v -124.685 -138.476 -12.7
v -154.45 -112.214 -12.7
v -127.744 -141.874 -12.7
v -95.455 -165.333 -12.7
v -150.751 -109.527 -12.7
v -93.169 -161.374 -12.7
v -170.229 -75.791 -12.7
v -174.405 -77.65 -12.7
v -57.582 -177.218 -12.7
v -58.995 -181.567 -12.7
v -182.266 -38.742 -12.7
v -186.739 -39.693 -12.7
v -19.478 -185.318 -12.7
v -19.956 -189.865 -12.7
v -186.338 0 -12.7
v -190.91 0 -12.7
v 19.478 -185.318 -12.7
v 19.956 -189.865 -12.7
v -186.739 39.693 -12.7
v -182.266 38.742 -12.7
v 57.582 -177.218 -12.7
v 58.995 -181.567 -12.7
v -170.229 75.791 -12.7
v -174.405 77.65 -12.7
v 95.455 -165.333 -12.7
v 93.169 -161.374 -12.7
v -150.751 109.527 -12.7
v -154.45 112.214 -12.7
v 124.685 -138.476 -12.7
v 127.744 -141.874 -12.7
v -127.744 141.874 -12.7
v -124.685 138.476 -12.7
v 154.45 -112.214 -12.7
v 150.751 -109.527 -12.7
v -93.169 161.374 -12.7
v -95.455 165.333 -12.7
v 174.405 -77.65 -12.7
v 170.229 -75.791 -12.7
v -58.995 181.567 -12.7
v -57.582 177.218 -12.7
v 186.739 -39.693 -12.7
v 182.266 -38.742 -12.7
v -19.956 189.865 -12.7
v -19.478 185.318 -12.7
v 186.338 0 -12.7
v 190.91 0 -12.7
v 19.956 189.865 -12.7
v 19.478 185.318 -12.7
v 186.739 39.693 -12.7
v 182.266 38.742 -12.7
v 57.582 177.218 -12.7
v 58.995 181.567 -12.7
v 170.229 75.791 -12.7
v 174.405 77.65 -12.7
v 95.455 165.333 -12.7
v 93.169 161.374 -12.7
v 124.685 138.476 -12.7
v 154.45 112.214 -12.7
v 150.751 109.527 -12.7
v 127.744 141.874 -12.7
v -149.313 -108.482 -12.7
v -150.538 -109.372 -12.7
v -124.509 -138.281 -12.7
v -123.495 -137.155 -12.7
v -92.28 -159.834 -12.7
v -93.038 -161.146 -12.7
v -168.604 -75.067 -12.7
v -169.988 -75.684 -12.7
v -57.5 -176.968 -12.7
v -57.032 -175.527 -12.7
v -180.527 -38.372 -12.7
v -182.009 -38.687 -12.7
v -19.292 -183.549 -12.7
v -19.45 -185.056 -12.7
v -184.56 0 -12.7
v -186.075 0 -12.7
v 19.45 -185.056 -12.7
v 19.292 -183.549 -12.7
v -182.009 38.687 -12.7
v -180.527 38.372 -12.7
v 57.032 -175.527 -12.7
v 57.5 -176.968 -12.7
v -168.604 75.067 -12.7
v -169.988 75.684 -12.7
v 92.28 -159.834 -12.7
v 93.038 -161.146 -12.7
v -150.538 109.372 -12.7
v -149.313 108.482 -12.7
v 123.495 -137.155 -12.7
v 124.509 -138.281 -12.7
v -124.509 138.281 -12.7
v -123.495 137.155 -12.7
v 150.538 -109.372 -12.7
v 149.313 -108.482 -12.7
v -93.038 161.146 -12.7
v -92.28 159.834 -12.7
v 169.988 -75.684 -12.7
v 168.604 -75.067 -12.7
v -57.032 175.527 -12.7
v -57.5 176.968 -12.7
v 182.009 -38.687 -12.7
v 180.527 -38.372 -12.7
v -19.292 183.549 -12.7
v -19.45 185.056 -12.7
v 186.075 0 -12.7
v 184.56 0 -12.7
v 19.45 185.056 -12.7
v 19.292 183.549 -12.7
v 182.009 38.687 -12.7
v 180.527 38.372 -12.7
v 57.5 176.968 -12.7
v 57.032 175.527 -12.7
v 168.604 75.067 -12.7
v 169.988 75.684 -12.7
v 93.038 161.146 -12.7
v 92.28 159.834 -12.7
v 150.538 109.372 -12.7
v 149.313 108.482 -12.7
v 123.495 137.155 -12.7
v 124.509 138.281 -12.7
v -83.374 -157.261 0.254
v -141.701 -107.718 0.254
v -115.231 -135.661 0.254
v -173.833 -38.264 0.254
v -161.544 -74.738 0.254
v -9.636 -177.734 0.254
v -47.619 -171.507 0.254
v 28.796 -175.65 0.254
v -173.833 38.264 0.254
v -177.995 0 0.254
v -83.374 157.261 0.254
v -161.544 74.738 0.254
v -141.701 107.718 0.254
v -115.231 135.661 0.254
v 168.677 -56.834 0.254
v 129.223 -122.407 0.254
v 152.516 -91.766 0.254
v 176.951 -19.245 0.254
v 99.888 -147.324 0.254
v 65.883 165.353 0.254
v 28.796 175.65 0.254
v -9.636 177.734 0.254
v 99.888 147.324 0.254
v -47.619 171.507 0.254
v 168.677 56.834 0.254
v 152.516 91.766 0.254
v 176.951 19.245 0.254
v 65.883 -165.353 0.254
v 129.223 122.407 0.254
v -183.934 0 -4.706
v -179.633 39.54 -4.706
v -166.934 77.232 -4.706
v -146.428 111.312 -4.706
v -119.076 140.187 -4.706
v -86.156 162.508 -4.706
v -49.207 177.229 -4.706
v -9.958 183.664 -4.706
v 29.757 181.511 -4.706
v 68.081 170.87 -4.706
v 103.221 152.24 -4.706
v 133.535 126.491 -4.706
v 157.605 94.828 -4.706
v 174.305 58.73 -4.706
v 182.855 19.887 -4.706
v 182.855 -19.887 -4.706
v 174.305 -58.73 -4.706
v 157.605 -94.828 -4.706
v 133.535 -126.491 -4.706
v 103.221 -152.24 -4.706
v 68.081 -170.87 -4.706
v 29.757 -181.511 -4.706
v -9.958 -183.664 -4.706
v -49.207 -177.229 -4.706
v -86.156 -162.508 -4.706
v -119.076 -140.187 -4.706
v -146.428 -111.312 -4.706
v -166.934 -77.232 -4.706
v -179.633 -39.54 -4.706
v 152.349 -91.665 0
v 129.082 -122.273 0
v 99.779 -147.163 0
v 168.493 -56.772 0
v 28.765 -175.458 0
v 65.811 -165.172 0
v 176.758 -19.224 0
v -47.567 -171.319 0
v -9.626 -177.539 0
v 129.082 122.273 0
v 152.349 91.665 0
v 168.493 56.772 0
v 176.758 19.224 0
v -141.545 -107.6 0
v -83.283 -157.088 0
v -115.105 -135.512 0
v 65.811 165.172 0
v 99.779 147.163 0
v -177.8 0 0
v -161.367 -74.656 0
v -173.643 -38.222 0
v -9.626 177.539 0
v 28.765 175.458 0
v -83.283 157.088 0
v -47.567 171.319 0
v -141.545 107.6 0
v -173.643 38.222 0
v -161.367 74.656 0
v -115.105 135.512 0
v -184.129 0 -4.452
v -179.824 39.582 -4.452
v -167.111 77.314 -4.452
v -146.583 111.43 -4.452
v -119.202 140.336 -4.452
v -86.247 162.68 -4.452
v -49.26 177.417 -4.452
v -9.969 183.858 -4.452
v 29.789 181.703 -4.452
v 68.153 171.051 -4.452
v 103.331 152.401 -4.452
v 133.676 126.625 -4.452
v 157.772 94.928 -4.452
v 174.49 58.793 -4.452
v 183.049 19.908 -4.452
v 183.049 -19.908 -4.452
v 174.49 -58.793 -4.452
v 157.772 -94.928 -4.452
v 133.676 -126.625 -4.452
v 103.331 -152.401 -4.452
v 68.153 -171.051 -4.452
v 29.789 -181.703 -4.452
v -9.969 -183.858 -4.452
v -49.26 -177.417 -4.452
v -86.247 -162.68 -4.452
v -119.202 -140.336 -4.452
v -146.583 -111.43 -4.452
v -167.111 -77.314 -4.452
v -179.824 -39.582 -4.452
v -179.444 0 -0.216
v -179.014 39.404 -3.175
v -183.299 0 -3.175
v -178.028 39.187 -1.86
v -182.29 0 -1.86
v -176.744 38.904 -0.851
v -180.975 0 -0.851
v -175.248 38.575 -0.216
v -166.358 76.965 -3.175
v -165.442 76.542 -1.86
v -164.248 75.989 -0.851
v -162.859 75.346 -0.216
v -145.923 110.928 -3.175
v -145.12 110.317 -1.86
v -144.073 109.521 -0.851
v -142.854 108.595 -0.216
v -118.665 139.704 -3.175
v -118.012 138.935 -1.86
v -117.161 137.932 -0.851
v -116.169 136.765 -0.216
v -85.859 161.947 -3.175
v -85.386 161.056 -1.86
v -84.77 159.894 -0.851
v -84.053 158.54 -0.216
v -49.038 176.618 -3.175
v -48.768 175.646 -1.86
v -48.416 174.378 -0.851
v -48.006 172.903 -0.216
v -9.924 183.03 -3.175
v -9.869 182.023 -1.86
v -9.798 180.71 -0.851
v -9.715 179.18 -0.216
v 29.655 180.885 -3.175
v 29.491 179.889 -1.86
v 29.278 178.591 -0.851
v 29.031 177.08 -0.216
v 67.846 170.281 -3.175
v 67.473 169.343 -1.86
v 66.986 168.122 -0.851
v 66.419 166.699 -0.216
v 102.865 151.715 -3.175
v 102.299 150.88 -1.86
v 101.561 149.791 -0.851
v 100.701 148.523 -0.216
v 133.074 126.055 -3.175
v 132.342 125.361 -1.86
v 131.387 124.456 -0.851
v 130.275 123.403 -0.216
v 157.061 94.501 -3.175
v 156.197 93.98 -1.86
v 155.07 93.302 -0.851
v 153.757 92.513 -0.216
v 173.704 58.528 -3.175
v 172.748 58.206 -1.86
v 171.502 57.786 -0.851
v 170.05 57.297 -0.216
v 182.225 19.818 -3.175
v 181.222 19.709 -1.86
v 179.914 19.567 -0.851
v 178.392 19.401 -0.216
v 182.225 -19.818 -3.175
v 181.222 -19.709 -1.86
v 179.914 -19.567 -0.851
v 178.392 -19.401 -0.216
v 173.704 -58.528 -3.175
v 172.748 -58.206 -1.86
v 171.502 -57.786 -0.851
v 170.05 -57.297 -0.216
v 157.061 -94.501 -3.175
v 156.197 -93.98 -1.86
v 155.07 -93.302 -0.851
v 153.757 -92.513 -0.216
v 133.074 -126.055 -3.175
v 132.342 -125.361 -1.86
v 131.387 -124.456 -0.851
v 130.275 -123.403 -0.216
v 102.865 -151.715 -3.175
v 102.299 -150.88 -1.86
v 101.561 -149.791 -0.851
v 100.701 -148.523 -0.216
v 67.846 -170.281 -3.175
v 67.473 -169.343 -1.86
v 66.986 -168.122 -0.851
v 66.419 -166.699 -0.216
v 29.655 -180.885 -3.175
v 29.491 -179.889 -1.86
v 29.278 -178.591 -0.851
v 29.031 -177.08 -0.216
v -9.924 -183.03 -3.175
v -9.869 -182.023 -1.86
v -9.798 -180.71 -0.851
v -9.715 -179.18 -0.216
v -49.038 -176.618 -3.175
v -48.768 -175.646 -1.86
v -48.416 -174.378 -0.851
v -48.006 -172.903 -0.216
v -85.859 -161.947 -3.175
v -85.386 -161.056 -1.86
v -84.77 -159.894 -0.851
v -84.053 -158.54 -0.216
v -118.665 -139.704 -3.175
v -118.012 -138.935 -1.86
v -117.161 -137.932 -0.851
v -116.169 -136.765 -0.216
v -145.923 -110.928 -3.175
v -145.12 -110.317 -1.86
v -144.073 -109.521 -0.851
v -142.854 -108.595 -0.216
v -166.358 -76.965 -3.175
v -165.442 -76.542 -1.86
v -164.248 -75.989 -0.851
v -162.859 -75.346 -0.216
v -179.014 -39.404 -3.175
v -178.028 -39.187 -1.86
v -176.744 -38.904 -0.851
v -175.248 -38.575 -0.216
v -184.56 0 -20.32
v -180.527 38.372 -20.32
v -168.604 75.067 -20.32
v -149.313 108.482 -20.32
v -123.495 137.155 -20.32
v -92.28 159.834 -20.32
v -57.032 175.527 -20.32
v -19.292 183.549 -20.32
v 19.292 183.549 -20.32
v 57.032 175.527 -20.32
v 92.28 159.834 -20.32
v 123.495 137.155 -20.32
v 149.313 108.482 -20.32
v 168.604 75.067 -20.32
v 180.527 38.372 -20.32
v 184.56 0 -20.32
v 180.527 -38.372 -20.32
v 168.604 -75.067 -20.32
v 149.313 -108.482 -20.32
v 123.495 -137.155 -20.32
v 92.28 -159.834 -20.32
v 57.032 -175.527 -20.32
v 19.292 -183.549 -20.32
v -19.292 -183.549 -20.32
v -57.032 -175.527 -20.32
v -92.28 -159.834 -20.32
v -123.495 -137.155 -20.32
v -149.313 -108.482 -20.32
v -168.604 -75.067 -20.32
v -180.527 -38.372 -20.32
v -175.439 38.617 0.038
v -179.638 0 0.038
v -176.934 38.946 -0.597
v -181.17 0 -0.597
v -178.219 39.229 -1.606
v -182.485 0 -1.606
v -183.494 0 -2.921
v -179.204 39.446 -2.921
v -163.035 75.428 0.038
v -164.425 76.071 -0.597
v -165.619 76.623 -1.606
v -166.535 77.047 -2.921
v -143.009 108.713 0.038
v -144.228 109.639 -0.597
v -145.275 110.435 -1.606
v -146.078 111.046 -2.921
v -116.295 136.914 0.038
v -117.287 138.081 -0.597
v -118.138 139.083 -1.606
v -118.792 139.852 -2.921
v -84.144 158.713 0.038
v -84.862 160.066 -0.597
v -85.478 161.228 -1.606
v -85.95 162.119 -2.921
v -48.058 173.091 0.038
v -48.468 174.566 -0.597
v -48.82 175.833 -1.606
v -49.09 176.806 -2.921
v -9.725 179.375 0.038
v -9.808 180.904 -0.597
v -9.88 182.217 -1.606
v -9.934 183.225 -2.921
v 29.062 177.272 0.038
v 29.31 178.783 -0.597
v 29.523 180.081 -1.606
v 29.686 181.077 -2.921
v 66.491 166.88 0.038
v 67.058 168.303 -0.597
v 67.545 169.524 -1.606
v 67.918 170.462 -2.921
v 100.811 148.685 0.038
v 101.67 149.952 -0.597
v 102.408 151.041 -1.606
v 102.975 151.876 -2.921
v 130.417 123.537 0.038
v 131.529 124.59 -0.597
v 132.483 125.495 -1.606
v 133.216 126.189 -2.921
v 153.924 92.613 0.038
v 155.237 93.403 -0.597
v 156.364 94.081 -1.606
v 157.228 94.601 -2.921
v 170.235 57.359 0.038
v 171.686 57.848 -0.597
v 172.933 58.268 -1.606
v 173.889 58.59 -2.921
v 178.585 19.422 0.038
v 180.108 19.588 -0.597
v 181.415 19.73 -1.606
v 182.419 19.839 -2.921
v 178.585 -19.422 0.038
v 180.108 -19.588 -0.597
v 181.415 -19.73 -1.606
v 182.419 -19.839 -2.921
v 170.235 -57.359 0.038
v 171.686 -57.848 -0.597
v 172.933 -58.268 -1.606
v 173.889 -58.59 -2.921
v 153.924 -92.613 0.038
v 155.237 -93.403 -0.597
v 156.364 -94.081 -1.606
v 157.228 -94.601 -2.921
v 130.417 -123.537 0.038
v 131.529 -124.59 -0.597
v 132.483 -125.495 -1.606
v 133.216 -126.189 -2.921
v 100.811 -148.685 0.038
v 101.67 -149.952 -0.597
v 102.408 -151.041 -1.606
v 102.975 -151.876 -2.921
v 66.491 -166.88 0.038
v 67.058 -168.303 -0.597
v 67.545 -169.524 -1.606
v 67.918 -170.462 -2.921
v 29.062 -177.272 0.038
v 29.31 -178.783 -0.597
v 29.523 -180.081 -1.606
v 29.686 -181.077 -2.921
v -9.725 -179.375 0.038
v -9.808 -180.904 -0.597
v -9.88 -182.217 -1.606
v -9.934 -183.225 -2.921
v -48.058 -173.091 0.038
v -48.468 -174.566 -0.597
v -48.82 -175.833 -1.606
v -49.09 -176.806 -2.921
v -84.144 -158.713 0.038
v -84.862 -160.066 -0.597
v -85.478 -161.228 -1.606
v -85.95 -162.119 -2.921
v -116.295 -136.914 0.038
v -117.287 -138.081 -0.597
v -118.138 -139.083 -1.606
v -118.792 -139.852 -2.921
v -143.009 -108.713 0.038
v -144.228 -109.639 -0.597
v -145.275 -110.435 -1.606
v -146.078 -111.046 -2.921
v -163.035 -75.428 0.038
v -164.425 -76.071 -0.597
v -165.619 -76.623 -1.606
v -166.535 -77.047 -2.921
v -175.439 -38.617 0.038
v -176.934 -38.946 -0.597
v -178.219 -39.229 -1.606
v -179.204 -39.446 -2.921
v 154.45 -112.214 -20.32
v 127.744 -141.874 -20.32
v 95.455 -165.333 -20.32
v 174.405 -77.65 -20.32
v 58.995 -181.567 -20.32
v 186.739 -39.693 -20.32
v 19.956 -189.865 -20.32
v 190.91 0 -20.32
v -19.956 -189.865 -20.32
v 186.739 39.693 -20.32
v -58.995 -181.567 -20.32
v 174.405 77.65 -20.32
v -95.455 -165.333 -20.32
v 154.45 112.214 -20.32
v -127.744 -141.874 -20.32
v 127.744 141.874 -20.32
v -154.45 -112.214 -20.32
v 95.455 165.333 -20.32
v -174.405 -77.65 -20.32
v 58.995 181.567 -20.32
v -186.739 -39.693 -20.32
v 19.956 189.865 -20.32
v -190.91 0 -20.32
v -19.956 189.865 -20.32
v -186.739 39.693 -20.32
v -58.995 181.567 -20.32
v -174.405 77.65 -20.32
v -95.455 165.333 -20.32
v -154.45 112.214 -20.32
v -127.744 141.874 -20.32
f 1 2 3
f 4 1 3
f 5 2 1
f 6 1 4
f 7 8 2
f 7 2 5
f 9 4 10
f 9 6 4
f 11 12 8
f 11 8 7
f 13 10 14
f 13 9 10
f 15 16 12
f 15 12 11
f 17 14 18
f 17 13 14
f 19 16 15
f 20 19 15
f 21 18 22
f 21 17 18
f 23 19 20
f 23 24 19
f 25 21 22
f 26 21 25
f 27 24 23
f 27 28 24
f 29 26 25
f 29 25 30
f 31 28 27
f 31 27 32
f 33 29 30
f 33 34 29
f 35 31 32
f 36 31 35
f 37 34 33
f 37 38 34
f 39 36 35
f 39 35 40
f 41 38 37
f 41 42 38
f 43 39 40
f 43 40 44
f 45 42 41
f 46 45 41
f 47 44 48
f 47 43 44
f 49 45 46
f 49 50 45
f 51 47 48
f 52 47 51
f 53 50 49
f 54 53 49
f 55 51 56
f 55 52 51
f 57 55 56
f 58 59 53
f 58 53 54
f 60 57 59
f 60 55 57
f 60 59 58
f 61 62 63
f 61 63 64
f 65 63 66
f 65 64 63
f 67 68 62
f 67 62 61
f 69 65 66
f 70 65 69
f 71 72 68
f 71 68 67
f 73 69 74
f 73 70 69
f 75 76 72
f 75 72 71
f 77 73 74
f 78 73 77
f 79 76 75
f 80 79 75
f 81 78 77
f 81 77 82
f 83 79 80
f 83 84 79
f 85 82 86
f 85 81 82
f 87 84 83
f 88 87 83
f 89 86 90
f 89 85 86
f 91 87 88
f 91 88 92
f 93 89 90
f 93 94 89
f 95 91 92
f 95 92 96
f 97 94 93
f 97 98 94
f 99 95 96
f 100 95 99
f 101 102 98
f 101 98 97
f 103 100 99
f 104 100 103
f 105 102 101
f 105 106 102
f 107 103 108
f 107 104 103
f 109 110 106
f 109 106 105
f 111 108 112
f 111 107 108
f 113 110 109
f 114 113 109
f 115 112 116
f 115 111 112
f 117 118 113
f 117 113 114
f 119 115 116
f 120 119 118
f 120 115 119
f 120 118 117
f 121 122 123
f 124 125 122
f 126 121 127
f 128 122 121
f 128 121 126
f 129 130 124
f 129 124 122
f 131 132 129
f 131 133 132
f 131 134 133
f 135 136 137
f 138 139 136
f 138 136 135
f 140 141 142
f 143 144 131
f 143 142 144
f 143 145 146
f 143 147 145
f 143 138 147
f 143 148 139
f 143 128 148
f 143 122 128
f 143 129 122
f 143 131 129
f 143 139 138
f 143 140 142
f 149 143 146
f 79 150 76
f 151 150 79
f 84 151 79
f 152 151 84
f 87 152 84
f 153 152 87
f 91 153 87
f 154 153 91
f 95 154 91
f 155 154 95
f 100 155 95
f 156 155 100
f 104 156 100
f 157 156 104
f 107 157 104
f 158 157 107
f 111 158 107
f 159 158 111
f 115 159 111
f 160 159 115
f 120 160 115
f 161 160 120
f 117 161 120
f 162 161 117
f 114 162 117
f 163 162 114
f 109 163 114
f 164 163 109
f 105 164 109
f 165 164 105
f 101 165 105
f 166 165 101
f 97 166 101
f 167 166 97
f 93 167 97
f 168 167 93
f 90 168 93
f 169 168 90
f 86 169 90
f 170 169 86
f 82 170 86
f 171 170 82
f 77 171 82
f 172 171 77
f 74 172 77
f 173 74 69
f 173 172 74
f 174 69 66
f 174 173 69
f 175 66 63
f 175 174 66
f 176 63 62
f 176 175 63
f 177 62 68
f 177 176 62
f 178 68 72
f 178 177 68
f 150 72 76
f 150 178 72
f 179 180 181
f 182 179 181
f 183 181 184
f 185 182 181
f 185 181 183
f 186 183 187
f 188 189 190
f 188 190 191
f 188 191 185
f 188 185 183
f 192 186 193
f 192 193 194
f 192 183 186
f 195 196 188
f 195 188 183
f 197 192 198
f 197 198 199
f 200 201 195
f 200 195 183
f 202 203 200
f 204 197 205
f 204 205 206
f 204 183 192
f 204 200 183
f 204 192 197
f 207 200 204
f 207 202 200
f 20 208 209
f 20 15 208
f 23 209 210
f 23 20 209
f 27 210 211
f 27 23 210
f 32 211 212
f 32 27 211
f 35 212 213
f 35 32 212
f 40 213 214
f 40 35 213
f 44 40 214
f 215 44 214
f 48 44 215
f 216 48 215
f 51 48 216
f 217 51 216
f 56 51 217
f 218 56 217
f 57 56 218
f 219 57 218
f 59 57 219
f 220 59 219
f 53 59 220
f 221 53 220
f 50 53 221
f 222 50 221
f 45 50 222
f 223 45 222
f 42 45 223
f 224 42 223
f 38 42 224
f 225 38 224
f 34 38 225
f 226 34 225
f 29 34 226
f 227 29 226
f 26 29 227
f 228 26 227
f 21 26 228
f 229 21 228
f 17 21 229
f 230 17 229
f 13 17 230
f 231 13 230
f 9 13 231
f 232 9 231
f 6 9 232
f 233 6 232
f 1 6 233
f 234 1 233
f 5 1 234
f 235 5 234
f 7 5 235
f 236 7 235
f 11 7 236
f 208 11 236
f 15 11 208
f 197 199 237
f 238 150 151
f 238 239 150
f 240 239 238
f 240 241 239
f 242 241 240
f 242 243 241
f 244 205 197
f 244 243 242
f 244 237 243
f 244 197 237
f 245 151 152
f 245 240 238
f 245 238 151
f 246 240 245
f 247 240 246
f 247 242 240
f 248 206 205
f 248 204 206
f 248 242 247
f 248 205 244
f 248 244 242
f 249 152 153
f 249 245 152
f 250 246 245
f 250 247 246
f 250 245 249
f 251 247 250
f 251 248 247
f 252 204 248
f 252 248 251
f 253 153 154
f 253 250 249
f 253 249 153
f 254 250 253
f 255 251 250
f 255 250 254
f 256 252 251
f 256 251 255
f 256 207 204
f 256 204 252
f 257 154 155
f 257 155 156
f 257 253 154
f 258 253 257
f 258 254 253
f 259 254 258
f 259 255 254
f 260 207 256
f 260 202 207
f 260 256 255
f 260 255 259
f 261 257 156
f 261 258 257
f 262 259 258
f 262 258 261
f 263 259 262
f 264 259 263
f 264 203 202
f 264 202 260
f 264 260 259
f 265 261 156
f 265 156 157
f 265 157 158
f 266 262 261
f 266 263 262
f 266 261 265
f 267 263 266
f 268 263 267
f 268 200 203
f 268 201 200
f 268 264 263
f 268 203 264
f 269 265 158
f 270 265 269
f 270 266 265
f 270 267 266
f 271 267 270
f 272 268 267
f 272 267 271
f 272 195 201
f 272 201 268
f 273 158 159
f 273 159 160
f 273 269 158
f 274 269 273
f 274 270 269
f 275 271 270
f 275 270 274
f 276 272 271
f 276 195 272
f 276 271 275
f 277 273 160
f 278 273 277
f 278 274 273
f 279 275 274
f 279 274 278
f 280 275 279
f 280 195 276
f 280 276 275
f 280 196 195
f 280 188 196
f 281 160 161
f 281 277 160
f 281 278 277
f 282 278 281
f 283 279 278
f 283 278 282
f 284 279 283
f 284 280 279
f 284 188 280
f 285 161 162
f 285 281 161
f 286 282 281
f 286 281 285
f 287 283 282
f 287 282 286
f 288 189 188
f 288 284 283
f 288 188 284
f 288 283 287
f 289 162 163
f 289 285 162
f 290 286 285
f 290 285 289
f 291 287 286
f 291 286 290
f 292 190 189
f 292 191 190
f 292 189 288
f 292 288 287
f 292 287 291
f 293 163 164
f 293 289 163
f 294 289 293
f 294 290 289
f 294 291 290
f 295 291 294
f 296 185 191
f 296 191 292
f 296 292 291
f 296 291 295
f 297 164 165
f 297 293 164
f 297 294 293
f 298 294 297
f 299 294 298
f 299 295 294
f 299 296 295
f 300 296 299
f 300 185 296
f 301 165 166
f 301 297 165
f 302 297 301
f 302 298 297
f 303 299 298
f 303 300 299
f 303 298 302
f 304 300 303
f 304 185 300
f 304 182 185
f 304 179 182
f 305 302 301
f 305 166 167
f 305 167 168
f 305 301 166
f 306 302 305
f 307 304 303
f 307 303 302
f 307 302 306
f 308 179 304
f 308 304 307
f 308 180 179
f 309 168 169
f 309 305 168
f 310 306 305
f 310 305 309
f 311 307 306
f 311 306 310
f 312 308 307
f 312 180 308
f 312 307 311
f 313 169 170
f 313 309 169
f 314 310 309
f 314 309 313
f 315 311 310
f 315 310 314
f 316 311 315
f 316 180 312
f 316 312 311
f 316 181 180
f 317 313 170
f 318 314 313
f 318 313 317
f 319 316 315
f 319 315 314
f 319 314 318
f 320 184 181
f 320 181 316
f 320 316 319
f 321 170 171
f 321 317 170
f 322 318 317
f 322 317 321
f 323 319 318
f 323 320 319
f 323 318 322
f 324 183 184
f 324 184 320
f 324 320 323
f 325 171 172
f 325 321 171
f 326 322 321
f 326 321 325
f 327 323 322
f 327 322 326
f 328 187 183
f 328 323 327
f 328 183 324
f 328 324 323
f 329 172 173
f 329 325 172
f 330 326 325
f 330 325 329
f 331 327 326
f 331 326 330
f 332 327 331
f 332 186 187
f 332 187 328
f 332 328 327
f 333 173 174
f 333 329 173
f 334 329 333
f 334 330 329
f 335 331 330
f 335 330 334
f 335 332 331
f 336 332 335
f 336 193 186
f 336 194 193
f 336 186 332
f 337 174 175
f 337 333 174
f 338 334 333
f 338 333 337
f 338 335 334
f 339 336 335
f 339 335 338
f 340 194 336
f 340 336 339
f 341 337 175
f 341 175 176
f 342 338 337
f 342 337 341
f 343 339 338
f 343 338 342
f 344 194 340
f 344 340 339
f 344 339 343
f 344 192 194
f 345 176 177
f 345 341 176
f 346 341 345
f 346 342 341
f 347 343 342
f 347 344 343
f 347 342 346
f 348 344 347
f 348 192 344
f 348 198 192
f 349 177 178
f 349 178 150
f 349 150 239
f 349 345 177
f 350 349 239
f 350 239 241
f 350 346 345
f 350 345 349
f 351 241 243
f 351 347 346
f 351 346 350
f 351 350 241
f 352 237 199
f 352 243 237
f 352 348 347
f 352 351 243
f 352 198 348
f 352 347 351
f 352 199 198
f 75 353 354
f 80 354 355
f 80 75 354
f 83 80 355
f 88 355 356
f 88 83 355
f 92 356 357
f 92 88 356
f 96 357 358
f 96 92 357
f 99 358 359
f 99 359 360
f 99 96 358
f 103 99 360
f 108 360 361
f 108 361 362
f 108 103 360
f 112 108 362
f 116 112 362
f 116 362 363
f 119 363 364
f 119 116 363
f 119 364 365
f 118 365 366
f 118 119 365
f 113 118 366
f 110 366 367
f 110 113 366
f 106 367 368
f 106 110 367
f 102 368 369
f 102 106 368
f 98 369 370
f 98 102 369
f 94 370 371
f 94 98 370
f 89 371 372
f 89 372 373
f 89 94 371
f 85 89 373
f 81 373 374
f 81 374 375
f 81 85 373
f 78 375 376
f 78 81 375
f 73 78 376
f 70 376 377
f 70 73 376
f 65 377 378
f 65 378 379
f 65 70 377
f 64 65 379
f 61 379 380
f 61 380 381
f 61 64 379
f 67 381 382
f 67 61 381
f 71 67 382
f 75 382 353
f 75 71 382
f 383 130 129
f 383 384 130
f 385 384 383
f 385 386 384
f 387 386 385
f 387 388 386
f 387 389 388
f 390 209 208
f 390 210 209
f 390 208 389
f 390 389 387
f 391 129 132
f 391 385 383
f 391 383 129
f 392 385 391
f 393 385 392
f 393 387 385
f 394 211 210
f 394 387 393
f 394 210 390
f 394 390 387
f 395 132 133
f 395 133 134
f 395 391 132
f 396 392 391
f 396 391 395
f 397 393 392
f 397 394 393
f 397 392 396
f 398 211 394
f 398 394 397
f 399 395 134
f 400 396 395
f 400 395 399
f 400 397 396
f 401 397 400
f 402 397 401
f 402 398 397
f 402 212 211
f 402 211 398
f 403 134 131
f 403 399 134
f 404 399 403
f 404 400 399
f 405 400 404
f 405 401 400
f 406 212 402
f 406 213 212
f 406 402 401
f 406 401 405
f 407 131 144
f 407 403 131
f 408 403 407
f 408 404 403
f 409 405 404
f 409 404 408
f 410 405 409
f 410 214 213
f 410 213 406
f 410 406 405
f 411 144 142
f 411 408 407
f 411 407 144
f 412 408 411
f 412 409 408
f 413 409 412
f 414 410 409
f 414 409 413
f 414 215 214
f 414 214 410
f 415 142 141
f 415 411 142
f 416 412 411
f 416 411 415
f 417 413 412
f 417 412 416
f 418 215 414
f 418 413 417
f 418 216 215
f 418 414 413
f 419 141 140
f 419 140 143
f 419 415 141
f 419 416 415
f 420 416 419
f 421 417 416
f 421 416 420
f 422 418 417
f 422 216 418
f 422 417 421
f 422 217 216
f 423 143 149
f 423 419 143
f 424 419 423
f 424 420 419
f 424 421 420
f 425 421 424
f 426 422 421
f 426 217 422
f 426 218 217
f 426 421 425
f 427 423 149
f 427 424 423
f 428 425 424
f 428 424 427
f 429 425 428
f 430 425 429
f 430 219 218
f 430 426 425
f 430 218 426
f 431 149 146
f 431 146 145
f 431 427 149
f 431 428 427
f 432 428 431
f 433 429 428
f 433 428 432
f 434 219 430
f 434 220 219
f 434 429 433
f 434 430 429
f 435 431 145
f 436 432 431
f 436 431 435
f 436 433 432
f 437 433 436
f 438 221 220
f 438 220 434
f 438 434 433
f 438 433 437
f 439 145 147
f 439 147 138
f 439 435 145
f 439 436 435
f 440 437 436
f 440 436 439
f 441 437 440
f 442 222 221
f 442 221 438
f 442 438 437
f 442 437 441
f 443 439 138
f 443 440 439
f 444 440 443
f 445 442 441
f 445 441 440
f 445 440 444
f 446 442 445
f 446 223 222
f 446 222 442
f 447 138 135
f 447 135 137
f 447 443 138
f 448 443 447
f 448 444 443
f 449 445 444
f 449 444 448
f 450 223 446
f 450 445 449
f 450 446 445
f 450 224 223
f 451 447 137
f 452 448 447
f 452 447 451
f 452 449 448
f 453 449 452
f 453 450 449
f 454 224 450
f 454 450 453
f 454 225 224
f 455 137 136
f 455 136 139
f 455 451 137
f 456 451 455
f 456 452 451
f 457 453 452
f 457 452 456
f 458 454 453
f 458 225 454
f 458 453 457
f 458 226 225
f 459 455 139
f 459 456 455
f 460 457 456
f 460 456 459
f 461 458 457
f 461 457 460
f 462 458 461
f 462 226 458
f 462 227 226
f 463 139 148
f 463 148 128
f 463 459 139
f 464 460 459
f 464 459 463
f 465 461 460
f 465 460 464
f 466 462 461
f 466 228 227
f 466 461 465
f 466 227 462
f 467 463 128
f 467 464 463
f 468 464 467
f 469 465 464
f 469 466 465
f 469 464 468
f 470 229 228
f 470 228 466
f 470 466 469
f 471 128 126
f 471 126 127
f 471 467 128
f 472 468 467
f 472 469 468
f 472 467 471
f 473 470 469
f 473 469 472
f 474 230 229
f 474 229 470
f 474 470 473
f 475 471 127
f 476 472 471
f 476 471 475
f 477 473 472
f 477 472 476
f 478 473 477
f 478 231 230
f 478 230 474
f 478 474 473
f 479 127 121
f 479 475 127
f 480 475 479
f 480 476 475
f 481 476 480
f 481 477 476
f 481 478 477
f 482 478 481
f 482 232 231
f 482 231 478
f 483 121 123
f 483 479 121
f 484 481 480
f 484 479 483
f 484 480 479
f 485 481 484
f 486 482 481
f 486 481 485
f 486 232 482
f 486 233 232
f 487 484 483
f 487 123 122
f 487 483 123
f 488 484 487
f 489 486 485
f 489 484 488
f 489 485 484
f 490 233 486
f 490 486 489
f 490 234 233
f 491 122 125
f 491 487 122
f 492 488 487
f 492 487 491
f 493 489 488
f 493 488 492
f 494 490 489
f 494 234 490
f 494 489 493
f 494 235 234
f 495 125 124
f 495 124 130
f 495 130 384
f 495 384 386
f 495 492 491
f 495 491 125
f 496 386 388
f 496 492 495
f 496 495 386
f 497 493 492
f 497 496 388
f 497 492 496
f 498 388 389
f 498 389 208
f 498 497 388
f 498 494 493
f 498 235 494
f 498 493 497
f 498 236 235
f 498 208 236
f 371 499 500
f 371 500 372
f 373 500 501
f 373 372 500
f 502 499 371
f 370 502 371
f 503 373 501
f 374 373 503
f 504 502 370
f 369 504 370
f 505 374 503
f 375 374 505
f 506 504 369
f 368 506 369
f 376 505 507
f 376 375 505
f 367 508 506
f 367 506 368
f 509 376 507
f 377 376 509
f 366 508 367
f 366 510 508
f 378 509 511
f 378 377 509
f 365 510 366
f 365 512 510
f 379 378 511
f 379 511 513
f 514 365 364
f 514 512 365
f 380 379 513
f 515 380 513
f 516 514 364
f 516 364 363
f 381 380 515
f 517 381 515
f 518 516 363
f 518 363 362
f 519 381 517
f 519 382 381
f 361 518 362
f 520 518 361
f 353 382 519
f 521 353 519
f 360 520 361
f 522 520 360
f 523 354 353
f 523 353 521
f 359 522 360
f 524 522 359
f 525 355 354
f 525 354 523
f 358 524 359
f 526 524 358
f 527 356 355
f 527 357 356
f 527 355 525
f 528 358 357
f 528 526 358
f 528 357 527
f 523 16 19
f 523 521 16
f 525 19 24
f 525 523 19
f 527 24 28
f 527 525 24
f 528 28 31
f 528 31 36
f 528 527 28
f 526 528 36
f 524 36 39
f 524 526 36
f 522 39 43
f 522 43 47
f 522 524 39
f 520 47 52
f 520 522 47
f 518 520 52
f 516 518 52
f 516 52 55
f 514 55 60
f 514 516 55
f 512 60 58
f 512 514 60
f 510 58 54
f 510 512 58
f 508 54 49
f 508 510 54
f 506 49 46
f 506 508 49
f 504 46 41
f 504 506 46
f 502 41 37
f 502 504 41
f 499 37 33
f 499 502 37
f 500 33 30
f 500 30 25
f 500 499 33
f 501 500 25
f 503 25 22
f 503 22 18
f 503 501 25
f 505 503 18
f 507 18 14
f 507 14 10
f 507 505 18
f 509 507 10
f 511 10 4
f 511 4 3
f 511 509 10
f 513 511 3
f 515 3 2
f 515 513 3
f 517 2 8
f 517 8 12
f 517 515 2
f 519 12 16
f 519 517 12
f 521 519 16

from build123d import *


with BuildPart() as f1:
    # F0 (on Front) → F1 (revolve)
    with BuildSketch(Plane.XZ):
        with BuildLine():
            Line((-177.8, 0), (0, 0))
            Line((0, 0), (0, 0.254))
            Line((0, 0.254), (-177.994901, 0.254))
            ThreePointArc((-177.994901, 0.254), (-181.860536, -1.058206), (-184.12853, -4.452499))
            Line((-184.12853, -4.452499), (-186.338441, -12.7))
            Line((-186.338441, -12.7), (-190.910441, -12.7))
            Line((-190.910441, -12.7), (-190.910441, -20.32))
            Line((-190.910441, -20.32), (-184.560441, -20.32))
            Line((-184.560441, -20.32), (-184.560441, -12.7))
            Line((-184.560441, -12.7), (-186.075481, -12.7))
            Line((-186.075481, -12.7), (-183.933629, -4.706499))
            ThreePointArc((-183.933629, -4.706499), (-181.665635, -1.312206), (-177.8, 0))
        make_face()
    revolve(axis=Axis((0, 0, -46.123708), (0, 0, -1)))


solid = f1.part
